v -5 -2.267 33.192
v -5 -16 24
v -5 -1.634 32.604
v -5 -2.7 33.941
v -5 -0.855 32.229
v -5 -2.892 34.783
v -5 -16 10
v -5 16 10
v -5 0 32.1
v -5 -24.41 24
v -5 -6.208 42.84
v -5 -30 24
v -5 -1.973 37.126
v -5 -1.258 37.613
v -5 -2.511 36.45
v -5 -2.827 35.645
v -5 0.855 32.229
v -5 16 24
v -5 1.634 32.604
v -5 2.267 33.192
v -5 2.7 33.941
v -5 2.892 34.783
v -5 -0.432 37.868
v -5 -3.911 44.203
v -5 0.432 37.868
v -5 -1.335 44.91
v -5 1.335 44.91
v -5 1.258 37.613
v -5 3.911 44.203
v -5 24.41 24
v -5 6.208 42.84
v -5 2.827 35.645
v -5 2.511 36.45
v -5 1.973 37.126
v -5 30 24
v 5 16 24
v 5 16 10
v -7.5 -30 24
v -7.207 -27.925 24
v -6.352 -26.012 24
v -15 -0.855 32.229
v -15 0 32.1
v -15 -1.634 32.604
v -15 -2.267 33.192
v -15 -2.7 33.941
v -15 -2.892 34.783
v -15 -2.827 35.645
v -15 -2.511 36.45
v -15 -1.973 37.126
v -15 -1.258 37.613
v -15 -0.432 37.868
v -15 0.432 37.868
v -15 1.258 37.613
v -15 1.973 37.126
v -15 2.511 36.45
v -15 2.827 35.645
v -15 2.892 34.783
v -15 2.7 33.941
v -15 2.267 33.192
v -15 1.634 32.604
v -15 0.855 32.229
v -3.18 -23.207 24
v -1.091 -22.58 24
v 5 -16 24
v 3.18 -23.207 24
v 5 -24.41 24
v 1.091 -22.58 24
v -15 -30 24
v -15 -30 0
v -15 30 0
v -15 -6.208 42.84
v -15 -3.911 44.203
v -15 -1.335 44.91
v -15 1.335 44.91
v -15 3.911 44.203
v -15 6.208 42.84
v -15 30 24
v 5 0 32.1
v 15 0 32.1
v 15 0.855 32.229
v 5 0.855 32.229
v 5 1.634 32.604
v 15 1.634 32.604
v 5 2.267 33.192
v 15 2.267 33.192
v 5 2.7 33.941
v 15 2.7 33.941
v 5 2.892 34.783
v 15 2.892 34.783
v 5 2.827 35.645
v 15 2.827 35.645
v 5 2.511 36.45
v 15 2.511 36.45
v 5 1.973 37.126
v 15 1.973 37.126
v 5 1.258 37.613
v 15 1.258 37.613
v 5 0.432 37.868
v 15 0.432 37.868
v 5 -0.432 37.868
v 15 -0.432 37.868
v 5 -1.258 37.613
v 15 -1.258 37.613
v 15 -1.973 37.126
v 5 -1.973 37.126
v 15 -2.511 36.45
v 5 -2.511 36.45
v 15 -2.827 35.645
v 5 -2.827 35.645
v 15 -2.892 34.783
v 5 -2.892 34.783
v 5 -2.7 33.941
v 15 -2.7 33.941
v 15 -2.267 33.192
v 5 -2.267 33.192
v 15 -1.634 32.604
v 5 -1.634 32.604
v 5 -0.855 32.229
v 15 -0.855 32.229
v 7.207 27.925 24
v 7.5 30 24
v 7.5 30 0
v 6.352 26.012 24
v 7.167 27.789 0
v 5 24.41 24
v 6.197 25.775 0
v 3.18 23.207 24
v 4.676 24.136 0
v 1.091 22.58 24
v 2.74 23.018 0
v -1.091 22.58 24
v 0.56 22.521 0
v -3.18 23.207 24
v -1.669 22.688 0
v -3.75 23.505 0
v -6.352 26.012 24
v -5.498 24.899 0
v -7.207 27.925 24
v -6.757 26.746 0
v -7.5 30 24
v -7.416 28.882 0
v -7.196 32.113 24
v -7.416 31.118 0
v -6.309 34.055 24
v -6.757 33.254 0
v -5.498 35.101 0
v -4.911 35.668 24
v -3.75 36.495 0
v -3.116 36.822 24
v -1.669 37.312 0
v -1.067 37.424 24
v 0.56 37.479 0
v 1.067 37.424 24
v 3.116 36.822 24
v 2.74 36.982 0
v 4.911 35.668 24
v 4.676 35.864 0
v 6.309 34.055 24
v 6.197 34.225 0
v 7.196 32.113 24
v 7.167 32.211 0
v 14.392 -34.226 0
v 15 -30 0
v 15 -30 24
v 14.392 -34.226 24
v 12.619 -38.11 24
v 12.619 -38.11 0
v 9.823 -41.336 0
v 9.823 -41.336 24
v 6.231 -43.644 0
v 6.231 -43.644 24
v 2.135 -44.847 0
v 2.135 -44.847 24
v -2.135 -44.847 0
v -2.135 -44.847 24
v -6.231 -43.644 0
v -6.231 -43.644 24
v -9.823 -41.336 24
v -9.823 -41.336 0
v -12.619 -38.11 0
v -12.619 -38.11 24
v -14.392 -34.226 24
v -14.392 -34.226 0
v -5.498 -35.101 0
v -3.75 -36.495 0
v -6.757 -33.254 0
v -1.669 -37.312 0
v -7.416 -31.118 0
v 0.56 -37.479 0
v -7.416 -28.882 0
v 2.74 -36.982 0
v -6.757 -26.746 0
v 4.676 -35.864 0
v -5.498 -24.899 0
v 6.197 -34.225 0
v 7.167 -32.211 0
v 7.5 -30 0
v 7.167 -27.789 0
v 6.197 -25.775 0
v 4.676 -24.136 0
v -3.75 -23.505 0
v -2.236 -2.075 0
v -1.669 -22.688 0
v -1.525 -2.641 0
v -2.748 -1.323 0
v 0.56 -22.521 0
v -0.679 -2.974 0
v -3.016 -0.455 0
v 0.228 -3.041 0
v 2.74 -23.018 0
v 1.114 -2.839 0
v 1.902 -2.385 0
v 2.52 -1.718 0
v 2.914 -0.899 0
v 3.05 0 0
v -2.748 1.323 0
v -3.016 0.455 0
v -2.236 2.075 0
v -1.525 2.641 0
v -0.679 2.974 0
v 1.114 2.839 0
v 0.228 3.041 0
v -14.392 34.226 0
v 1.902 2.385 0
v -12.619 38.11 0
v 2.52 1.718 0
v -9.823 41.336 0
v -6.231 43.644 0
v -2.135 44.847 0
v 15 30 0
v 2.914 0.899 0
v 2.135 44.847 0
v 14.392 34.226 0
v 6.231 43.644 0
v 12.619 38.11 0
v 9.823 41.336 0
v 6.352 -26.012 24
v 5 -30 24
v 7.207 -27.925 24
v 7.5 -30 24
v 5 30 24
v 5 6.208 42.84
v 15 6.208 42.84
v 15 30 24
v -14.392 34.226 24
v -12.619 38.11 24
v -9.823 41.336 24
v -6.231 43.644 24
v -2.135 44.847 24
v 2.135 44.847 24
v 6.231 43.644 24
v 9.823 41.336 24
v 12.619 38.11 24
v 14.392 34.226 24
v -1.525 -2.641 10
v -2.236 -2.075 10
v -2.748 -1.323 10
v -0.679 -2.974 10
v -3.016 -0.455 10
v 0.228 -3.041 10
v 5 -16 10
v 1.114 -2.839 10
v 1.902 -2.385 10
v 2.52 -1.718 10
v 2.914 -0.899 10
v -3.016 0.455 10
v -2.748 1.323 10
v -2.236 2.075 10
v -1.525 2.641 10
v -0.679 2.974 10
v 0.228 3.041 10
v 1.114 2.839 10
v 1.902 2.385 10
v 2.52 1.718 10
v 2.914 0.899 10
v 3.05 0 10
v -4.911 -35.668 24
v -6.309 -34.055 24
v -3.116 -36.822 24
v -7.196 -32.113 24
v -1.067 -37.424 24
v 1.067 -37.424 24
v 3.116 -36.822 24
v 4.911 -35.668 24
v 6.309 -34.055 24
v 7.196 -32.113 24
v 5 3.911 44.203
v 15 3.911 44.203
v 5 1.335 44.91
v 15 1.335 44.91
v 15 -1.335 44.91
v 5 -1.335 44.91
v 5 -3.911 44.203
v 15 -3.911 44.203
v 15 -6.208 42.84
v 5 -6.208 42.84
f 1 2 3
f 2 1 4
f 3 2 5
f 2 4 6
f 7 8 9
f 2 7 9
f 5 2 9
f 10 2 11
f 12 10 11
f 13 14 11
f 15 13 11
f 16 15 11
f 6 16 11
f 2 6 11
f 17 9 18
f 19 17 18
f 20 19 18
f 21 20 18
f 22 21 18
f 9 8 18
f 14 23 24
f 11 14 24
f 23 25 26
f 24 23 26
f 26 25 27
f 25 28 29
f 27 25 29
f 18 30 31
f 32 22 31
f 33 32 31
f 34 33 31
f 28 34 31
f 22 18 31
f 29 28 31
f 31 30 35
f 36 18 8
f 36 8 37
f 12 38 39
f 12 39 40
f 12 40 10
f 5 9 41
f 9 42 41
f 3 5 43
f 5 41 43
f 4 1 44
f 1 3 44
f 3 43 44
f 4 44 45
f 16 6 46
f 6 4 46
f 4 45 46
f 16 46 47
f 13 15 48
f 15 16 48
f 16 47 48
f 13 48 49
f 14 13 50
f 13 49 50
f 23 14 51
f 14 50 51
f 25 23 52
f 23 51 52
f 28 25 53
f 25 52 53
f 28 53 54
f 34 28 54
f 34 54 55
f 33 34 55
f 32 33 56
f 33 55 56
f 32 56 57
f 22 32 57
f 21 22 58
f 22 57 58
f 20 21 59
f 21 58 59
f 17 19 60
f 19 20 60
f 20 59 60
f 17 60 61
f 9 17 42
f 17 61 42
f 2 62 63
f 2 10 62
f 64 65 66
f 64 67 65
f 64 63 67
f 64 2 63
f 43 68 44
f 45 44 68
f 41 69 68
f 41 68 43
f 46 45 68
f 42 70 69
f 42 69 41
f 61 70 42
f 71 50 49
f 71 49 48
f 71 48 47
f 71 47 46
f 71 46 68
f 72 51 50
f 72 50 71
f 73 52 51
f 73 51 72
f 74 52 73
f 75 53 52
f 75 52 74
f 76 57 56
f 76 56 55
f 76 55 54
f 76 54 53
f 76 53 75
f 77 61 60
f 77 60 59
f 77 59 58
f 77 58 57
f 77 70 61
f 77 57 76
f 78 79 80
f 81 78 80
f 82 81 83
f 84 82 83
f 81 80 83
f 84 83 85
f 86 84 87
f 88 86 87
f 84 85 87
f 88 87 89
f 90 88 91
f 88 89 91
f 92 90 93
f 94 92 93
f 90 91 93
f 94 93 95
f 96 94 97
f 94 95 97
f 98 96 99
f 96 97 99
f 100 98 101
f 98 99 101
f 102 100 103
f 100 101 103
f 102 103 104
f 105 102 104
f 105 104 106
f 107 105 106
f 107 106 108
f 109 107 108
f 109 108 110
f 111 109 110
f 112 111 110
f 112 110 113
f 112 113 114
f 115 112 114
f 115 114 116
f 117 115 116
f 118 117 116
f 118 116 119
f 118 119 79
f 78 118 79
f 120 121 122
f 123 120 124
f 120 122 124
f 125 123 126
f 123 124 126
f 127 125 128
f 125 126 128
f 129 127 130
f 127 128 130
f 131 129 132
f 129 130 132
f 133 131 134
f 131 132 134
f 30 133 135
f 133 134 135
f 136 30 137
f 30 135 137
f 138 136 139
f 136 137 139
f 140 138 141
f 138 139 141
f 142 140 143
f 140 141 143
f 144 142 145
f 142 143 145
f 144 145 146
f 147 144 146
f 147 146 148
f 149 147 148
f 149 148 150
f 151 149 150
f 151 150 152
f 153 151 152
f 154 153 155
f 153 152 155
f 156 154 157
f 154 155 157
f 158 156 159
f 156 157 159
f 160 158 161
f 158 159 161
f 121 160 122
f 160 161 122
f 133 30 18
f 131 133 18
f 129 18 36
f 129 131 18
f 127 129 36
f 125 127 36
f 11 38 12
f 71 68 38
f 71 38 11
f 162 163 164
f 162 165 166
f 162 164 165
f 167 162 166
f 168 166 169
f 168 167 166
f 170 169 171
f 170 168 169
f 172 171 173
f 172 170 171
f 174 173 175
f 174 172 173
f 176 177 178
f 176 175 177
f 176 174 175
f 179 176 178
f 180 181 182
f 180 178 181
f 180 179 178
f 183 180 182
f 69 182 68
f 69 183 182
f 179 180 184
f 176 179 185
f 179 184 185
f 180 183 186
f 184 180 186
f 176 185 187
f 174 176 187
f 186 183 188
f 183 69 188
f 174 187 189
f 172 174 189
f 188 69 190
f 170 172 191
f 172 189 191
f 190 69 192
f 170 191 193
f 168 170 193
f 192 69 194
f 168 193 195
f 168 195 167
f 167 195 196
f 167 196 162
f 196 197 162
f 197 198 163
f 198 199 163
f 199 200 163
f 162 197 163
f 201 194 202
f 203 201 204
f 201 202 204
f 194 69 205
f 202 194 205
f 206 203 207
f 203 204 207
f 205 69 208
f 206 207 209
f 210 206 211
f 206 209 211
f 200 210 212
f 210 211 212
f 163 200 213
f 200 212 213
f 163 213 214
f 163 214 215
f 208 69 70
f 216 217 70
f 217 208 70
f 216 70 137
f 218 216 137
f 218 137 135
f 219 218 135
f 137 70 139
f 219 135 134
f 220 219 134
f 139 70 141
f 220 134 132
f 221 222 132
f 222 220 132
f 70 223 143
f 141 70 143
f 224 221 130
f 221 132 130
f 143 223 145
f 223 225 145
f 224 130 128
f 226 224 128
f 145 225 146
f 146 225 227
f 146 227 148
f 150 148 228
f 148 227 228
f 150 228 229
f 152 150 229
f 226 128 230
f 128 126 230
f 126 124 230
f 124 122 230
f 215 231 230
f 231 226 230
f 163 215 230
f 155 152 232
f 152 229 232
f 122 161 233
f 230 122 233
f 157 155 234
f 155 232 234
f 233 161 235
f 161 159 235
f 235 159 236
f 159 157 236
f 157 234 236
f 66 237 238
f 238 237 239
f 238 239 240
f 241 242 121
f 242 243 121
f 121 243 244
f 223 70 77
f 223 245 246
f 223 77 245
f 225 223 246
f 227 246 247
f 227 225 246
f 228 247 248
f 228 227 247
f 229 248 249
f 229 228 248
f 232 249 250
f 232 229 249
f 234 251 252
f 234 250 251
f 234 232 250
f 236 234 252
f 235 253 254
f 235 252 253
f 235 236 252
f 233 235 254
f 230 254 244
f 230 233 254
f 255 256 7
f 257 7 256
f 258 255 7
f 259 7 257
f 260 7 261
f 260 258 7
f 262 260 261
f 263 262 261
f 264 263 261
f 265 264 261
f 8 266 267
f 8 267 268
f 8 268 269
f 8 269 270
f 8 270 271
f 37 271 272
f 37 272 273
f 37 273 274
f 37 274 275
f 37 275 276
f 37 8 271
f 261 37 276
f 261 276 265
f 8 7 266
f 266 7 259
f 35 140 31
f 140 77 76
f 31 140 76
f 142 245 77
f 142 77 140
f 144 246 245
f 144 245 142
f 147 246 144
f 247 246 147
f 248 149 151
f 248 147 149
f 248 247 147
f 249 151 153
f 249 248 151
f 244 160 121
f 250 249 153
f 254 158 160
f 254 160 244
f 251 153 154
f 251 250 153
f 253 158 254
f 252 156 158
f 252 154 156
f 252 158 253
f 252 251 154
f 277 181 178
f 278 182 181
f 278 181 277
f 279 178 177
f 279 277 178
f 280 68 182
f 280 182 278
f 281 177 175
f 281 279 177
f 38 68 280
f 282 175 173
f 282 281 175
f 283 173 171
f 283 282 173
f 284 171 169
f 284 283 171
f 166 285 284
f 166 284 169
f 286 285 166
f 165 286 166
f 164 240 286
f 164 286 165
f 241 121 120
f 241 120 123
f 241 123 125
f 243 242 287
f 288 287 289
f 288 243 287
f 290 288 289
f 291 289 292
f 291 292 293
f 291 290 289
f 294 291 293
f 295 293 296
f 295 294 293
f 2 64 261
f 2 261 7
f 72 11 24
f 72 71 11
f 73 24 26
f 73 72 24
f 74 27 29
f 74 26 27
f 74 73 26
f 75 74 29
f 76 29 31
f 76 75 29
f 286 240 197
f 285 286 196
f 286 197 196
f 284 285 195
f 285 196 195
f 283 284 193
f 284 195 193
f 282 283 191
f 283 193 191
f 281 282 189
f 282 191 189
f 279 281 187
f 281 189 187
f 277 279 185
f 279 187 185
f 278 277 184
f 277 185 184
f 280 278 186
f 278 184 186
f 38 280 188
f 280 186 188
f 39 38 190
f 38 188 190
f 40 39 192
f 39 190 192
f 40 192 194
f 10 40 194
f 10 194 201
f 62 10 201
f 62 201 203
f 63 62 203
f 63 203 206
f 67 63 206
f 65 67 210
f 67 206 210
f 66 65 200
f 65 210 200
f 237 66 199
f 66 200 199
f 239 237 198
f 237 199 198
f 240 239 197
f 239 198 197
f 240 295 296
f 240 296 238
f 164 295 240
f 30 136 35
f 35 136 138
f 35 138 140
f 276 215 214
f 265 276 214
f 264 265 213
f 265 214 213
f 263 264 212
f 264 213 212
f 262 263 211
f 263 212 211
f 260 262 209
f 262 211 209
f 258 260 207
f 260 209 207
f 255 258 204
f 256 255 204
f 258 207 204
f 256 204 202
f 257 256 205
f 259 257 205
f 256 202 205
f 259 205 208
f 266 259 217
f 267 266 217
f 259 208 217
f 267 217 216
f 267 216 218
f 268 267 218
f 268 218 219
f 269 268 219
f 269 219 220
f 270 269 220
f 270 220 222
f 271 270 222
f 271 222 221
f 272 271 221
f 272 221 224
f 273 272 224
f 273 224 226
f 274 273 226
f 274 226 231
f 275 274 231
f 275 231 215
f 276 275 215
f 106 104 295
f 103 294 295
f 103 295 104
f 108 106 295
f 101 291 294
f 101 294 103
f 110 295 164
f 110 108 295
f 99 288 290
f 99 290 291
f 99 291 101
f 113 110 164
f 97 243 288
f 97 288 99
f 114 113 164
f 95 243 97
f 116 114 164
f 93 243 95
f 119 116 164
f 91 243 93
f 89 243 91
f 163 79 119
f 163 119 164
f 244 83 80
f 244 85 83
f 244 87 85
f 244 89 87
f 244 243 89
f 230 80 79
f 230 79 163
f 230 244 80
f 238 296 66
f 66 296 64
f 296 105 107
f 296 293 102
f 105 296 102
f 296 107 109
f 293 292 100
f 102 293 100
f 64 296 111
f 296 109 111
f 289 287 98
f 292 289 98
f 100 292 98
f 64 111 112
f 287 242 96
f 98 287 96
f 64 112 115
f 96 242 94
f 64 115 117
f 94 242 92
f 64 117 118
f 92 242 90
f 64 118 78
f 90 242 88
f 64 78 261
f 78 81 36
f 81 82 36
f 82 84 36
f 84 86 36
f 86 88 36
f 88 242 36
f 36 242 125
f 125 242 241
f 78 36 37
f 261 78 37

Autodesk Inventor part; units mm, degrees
ref_plane "YZ Plane" through (0, 0, 0) normal (1, 0, 0) x (0, 1, 0)
ref_plane "XZ Plane" through (0, 0, 0) normal (0, 1, 0) x (-1, 0, 0)
ref_plane "XY Plane" through (0, 0, 0) normal (0, 0, 1) x (1, 0, 0)
sketch "Sketch1" plane through (0, 0, 0) normal (0, 0, 1) x (1, 0, 0)
  circle A0 centre (0, 0) radius 3.05
  line L0 (0, 30) -> (0, -30) construction
  circle A1 centre (0, 30) radius 7.5
  circle A2 centre (0, -30) radius 7.5
  line L1 (0, 30) -> (0, -30) construction
  line L2 (15, 30) -> (15, -30)
  line L3 (-15, -30) -> (-15, 30)
  arc A3 (15, 30) -> (-15, 30) centre (0, 30) ccw
  arc A4 (-15, -30) -> (15, -30) centre (0, -30) ccw
  point P0 (0, 0)
  dimension "d0" = 30
  dimension "d1" = 6.1
  dimension "d2" = 15
  dimension "d3" = 30
extrude "Extrusion1" add sketch "Sketch1" along normal blind 24
sketch "Sketch2" plane through (0, 0, 24) normal (0, 0, 1) x (1, 0, 0)
  circle A0 centre (0, -30) radius 7.5 construction
  circle A1 centre (0, 30) radius 7.5 construction
  circle A2 centre (0, 0) radius 3.05 construction
  line L0 (15, -30) -> (15, 30) construction
  arc A3 (15, 30) -> (-15, 30) centre (0, 30) ccw construction
  line L1 (-15, 30) -> (-15, -30) construction
  arc A4 (-15, -30) -> (15, -30) centre (0, -30) ccw construction
  line L2 (5, -16) -> (-5, -16)
  line L3 (-5, -16) -> (-5, 16)
  line L4 (-5, 16) -> (5, 16)
  line L5 (5, 16) -> (5, -16)
  line L6 (5, -16) -> (-5, 16) construction
  line L7 (-5, -16) -> (5, 16) construction
  dimension "d6" = 10
  dimension "d7" = 32
extrude "Extrusion2" cut sketch "Sketch2" against normal blind 14
sketch "Sketch3" plane through (15, -30, 0) normal (1, 0, 0) x (0, 0, -1)
  line L0 (0, 60) -> (0, 0) construction
  line L1 (0, 60) -> (-24, 60) construction
  line L2 (-24, 0) -> (-24, 60) construction
  line L3 (0, 0) -> (-24, 0) construction
  line L4 (-24, 14) -> (-24, 46) construction
  line L5 (-24, 14) -> (-10, 14) construction
  line L6 (-10, 14) -> (-10, 46) construction
  line L7 (-24, 46) -> (-10, 46) construction
  line L8 (-24, 30) -> (-35, 30) construction
  circle A0 centre (-35, 30) radius 2.9
  arc A1 (-42.8398, 36.2079) -> (-42.8398, 23.7921) centre (-35, 30) ccw
  line L9 (-42.8398, 36.2079) -> (-24, 60)
  line L10 (-42.8398, 23.7921) -> (-24, 0)
  line L11 (-24, 60) -> (-24, 0)
  line L12 (-24, 52.5) -> (-24, 67.5) projected
  point P0 (0, 30)
  dimension "d10" = 25
  dimension "d11" = 5.8
  dimension "d12" = 10
extrude "Extrusion3" add sketch "Sketch3" against normal up to surface (10 mm away)
mirror "Mirror1" about plane through (0, 0, 0) normal (1, 0, 0) of "Extrusion3"
properties part number "combo cross head"
